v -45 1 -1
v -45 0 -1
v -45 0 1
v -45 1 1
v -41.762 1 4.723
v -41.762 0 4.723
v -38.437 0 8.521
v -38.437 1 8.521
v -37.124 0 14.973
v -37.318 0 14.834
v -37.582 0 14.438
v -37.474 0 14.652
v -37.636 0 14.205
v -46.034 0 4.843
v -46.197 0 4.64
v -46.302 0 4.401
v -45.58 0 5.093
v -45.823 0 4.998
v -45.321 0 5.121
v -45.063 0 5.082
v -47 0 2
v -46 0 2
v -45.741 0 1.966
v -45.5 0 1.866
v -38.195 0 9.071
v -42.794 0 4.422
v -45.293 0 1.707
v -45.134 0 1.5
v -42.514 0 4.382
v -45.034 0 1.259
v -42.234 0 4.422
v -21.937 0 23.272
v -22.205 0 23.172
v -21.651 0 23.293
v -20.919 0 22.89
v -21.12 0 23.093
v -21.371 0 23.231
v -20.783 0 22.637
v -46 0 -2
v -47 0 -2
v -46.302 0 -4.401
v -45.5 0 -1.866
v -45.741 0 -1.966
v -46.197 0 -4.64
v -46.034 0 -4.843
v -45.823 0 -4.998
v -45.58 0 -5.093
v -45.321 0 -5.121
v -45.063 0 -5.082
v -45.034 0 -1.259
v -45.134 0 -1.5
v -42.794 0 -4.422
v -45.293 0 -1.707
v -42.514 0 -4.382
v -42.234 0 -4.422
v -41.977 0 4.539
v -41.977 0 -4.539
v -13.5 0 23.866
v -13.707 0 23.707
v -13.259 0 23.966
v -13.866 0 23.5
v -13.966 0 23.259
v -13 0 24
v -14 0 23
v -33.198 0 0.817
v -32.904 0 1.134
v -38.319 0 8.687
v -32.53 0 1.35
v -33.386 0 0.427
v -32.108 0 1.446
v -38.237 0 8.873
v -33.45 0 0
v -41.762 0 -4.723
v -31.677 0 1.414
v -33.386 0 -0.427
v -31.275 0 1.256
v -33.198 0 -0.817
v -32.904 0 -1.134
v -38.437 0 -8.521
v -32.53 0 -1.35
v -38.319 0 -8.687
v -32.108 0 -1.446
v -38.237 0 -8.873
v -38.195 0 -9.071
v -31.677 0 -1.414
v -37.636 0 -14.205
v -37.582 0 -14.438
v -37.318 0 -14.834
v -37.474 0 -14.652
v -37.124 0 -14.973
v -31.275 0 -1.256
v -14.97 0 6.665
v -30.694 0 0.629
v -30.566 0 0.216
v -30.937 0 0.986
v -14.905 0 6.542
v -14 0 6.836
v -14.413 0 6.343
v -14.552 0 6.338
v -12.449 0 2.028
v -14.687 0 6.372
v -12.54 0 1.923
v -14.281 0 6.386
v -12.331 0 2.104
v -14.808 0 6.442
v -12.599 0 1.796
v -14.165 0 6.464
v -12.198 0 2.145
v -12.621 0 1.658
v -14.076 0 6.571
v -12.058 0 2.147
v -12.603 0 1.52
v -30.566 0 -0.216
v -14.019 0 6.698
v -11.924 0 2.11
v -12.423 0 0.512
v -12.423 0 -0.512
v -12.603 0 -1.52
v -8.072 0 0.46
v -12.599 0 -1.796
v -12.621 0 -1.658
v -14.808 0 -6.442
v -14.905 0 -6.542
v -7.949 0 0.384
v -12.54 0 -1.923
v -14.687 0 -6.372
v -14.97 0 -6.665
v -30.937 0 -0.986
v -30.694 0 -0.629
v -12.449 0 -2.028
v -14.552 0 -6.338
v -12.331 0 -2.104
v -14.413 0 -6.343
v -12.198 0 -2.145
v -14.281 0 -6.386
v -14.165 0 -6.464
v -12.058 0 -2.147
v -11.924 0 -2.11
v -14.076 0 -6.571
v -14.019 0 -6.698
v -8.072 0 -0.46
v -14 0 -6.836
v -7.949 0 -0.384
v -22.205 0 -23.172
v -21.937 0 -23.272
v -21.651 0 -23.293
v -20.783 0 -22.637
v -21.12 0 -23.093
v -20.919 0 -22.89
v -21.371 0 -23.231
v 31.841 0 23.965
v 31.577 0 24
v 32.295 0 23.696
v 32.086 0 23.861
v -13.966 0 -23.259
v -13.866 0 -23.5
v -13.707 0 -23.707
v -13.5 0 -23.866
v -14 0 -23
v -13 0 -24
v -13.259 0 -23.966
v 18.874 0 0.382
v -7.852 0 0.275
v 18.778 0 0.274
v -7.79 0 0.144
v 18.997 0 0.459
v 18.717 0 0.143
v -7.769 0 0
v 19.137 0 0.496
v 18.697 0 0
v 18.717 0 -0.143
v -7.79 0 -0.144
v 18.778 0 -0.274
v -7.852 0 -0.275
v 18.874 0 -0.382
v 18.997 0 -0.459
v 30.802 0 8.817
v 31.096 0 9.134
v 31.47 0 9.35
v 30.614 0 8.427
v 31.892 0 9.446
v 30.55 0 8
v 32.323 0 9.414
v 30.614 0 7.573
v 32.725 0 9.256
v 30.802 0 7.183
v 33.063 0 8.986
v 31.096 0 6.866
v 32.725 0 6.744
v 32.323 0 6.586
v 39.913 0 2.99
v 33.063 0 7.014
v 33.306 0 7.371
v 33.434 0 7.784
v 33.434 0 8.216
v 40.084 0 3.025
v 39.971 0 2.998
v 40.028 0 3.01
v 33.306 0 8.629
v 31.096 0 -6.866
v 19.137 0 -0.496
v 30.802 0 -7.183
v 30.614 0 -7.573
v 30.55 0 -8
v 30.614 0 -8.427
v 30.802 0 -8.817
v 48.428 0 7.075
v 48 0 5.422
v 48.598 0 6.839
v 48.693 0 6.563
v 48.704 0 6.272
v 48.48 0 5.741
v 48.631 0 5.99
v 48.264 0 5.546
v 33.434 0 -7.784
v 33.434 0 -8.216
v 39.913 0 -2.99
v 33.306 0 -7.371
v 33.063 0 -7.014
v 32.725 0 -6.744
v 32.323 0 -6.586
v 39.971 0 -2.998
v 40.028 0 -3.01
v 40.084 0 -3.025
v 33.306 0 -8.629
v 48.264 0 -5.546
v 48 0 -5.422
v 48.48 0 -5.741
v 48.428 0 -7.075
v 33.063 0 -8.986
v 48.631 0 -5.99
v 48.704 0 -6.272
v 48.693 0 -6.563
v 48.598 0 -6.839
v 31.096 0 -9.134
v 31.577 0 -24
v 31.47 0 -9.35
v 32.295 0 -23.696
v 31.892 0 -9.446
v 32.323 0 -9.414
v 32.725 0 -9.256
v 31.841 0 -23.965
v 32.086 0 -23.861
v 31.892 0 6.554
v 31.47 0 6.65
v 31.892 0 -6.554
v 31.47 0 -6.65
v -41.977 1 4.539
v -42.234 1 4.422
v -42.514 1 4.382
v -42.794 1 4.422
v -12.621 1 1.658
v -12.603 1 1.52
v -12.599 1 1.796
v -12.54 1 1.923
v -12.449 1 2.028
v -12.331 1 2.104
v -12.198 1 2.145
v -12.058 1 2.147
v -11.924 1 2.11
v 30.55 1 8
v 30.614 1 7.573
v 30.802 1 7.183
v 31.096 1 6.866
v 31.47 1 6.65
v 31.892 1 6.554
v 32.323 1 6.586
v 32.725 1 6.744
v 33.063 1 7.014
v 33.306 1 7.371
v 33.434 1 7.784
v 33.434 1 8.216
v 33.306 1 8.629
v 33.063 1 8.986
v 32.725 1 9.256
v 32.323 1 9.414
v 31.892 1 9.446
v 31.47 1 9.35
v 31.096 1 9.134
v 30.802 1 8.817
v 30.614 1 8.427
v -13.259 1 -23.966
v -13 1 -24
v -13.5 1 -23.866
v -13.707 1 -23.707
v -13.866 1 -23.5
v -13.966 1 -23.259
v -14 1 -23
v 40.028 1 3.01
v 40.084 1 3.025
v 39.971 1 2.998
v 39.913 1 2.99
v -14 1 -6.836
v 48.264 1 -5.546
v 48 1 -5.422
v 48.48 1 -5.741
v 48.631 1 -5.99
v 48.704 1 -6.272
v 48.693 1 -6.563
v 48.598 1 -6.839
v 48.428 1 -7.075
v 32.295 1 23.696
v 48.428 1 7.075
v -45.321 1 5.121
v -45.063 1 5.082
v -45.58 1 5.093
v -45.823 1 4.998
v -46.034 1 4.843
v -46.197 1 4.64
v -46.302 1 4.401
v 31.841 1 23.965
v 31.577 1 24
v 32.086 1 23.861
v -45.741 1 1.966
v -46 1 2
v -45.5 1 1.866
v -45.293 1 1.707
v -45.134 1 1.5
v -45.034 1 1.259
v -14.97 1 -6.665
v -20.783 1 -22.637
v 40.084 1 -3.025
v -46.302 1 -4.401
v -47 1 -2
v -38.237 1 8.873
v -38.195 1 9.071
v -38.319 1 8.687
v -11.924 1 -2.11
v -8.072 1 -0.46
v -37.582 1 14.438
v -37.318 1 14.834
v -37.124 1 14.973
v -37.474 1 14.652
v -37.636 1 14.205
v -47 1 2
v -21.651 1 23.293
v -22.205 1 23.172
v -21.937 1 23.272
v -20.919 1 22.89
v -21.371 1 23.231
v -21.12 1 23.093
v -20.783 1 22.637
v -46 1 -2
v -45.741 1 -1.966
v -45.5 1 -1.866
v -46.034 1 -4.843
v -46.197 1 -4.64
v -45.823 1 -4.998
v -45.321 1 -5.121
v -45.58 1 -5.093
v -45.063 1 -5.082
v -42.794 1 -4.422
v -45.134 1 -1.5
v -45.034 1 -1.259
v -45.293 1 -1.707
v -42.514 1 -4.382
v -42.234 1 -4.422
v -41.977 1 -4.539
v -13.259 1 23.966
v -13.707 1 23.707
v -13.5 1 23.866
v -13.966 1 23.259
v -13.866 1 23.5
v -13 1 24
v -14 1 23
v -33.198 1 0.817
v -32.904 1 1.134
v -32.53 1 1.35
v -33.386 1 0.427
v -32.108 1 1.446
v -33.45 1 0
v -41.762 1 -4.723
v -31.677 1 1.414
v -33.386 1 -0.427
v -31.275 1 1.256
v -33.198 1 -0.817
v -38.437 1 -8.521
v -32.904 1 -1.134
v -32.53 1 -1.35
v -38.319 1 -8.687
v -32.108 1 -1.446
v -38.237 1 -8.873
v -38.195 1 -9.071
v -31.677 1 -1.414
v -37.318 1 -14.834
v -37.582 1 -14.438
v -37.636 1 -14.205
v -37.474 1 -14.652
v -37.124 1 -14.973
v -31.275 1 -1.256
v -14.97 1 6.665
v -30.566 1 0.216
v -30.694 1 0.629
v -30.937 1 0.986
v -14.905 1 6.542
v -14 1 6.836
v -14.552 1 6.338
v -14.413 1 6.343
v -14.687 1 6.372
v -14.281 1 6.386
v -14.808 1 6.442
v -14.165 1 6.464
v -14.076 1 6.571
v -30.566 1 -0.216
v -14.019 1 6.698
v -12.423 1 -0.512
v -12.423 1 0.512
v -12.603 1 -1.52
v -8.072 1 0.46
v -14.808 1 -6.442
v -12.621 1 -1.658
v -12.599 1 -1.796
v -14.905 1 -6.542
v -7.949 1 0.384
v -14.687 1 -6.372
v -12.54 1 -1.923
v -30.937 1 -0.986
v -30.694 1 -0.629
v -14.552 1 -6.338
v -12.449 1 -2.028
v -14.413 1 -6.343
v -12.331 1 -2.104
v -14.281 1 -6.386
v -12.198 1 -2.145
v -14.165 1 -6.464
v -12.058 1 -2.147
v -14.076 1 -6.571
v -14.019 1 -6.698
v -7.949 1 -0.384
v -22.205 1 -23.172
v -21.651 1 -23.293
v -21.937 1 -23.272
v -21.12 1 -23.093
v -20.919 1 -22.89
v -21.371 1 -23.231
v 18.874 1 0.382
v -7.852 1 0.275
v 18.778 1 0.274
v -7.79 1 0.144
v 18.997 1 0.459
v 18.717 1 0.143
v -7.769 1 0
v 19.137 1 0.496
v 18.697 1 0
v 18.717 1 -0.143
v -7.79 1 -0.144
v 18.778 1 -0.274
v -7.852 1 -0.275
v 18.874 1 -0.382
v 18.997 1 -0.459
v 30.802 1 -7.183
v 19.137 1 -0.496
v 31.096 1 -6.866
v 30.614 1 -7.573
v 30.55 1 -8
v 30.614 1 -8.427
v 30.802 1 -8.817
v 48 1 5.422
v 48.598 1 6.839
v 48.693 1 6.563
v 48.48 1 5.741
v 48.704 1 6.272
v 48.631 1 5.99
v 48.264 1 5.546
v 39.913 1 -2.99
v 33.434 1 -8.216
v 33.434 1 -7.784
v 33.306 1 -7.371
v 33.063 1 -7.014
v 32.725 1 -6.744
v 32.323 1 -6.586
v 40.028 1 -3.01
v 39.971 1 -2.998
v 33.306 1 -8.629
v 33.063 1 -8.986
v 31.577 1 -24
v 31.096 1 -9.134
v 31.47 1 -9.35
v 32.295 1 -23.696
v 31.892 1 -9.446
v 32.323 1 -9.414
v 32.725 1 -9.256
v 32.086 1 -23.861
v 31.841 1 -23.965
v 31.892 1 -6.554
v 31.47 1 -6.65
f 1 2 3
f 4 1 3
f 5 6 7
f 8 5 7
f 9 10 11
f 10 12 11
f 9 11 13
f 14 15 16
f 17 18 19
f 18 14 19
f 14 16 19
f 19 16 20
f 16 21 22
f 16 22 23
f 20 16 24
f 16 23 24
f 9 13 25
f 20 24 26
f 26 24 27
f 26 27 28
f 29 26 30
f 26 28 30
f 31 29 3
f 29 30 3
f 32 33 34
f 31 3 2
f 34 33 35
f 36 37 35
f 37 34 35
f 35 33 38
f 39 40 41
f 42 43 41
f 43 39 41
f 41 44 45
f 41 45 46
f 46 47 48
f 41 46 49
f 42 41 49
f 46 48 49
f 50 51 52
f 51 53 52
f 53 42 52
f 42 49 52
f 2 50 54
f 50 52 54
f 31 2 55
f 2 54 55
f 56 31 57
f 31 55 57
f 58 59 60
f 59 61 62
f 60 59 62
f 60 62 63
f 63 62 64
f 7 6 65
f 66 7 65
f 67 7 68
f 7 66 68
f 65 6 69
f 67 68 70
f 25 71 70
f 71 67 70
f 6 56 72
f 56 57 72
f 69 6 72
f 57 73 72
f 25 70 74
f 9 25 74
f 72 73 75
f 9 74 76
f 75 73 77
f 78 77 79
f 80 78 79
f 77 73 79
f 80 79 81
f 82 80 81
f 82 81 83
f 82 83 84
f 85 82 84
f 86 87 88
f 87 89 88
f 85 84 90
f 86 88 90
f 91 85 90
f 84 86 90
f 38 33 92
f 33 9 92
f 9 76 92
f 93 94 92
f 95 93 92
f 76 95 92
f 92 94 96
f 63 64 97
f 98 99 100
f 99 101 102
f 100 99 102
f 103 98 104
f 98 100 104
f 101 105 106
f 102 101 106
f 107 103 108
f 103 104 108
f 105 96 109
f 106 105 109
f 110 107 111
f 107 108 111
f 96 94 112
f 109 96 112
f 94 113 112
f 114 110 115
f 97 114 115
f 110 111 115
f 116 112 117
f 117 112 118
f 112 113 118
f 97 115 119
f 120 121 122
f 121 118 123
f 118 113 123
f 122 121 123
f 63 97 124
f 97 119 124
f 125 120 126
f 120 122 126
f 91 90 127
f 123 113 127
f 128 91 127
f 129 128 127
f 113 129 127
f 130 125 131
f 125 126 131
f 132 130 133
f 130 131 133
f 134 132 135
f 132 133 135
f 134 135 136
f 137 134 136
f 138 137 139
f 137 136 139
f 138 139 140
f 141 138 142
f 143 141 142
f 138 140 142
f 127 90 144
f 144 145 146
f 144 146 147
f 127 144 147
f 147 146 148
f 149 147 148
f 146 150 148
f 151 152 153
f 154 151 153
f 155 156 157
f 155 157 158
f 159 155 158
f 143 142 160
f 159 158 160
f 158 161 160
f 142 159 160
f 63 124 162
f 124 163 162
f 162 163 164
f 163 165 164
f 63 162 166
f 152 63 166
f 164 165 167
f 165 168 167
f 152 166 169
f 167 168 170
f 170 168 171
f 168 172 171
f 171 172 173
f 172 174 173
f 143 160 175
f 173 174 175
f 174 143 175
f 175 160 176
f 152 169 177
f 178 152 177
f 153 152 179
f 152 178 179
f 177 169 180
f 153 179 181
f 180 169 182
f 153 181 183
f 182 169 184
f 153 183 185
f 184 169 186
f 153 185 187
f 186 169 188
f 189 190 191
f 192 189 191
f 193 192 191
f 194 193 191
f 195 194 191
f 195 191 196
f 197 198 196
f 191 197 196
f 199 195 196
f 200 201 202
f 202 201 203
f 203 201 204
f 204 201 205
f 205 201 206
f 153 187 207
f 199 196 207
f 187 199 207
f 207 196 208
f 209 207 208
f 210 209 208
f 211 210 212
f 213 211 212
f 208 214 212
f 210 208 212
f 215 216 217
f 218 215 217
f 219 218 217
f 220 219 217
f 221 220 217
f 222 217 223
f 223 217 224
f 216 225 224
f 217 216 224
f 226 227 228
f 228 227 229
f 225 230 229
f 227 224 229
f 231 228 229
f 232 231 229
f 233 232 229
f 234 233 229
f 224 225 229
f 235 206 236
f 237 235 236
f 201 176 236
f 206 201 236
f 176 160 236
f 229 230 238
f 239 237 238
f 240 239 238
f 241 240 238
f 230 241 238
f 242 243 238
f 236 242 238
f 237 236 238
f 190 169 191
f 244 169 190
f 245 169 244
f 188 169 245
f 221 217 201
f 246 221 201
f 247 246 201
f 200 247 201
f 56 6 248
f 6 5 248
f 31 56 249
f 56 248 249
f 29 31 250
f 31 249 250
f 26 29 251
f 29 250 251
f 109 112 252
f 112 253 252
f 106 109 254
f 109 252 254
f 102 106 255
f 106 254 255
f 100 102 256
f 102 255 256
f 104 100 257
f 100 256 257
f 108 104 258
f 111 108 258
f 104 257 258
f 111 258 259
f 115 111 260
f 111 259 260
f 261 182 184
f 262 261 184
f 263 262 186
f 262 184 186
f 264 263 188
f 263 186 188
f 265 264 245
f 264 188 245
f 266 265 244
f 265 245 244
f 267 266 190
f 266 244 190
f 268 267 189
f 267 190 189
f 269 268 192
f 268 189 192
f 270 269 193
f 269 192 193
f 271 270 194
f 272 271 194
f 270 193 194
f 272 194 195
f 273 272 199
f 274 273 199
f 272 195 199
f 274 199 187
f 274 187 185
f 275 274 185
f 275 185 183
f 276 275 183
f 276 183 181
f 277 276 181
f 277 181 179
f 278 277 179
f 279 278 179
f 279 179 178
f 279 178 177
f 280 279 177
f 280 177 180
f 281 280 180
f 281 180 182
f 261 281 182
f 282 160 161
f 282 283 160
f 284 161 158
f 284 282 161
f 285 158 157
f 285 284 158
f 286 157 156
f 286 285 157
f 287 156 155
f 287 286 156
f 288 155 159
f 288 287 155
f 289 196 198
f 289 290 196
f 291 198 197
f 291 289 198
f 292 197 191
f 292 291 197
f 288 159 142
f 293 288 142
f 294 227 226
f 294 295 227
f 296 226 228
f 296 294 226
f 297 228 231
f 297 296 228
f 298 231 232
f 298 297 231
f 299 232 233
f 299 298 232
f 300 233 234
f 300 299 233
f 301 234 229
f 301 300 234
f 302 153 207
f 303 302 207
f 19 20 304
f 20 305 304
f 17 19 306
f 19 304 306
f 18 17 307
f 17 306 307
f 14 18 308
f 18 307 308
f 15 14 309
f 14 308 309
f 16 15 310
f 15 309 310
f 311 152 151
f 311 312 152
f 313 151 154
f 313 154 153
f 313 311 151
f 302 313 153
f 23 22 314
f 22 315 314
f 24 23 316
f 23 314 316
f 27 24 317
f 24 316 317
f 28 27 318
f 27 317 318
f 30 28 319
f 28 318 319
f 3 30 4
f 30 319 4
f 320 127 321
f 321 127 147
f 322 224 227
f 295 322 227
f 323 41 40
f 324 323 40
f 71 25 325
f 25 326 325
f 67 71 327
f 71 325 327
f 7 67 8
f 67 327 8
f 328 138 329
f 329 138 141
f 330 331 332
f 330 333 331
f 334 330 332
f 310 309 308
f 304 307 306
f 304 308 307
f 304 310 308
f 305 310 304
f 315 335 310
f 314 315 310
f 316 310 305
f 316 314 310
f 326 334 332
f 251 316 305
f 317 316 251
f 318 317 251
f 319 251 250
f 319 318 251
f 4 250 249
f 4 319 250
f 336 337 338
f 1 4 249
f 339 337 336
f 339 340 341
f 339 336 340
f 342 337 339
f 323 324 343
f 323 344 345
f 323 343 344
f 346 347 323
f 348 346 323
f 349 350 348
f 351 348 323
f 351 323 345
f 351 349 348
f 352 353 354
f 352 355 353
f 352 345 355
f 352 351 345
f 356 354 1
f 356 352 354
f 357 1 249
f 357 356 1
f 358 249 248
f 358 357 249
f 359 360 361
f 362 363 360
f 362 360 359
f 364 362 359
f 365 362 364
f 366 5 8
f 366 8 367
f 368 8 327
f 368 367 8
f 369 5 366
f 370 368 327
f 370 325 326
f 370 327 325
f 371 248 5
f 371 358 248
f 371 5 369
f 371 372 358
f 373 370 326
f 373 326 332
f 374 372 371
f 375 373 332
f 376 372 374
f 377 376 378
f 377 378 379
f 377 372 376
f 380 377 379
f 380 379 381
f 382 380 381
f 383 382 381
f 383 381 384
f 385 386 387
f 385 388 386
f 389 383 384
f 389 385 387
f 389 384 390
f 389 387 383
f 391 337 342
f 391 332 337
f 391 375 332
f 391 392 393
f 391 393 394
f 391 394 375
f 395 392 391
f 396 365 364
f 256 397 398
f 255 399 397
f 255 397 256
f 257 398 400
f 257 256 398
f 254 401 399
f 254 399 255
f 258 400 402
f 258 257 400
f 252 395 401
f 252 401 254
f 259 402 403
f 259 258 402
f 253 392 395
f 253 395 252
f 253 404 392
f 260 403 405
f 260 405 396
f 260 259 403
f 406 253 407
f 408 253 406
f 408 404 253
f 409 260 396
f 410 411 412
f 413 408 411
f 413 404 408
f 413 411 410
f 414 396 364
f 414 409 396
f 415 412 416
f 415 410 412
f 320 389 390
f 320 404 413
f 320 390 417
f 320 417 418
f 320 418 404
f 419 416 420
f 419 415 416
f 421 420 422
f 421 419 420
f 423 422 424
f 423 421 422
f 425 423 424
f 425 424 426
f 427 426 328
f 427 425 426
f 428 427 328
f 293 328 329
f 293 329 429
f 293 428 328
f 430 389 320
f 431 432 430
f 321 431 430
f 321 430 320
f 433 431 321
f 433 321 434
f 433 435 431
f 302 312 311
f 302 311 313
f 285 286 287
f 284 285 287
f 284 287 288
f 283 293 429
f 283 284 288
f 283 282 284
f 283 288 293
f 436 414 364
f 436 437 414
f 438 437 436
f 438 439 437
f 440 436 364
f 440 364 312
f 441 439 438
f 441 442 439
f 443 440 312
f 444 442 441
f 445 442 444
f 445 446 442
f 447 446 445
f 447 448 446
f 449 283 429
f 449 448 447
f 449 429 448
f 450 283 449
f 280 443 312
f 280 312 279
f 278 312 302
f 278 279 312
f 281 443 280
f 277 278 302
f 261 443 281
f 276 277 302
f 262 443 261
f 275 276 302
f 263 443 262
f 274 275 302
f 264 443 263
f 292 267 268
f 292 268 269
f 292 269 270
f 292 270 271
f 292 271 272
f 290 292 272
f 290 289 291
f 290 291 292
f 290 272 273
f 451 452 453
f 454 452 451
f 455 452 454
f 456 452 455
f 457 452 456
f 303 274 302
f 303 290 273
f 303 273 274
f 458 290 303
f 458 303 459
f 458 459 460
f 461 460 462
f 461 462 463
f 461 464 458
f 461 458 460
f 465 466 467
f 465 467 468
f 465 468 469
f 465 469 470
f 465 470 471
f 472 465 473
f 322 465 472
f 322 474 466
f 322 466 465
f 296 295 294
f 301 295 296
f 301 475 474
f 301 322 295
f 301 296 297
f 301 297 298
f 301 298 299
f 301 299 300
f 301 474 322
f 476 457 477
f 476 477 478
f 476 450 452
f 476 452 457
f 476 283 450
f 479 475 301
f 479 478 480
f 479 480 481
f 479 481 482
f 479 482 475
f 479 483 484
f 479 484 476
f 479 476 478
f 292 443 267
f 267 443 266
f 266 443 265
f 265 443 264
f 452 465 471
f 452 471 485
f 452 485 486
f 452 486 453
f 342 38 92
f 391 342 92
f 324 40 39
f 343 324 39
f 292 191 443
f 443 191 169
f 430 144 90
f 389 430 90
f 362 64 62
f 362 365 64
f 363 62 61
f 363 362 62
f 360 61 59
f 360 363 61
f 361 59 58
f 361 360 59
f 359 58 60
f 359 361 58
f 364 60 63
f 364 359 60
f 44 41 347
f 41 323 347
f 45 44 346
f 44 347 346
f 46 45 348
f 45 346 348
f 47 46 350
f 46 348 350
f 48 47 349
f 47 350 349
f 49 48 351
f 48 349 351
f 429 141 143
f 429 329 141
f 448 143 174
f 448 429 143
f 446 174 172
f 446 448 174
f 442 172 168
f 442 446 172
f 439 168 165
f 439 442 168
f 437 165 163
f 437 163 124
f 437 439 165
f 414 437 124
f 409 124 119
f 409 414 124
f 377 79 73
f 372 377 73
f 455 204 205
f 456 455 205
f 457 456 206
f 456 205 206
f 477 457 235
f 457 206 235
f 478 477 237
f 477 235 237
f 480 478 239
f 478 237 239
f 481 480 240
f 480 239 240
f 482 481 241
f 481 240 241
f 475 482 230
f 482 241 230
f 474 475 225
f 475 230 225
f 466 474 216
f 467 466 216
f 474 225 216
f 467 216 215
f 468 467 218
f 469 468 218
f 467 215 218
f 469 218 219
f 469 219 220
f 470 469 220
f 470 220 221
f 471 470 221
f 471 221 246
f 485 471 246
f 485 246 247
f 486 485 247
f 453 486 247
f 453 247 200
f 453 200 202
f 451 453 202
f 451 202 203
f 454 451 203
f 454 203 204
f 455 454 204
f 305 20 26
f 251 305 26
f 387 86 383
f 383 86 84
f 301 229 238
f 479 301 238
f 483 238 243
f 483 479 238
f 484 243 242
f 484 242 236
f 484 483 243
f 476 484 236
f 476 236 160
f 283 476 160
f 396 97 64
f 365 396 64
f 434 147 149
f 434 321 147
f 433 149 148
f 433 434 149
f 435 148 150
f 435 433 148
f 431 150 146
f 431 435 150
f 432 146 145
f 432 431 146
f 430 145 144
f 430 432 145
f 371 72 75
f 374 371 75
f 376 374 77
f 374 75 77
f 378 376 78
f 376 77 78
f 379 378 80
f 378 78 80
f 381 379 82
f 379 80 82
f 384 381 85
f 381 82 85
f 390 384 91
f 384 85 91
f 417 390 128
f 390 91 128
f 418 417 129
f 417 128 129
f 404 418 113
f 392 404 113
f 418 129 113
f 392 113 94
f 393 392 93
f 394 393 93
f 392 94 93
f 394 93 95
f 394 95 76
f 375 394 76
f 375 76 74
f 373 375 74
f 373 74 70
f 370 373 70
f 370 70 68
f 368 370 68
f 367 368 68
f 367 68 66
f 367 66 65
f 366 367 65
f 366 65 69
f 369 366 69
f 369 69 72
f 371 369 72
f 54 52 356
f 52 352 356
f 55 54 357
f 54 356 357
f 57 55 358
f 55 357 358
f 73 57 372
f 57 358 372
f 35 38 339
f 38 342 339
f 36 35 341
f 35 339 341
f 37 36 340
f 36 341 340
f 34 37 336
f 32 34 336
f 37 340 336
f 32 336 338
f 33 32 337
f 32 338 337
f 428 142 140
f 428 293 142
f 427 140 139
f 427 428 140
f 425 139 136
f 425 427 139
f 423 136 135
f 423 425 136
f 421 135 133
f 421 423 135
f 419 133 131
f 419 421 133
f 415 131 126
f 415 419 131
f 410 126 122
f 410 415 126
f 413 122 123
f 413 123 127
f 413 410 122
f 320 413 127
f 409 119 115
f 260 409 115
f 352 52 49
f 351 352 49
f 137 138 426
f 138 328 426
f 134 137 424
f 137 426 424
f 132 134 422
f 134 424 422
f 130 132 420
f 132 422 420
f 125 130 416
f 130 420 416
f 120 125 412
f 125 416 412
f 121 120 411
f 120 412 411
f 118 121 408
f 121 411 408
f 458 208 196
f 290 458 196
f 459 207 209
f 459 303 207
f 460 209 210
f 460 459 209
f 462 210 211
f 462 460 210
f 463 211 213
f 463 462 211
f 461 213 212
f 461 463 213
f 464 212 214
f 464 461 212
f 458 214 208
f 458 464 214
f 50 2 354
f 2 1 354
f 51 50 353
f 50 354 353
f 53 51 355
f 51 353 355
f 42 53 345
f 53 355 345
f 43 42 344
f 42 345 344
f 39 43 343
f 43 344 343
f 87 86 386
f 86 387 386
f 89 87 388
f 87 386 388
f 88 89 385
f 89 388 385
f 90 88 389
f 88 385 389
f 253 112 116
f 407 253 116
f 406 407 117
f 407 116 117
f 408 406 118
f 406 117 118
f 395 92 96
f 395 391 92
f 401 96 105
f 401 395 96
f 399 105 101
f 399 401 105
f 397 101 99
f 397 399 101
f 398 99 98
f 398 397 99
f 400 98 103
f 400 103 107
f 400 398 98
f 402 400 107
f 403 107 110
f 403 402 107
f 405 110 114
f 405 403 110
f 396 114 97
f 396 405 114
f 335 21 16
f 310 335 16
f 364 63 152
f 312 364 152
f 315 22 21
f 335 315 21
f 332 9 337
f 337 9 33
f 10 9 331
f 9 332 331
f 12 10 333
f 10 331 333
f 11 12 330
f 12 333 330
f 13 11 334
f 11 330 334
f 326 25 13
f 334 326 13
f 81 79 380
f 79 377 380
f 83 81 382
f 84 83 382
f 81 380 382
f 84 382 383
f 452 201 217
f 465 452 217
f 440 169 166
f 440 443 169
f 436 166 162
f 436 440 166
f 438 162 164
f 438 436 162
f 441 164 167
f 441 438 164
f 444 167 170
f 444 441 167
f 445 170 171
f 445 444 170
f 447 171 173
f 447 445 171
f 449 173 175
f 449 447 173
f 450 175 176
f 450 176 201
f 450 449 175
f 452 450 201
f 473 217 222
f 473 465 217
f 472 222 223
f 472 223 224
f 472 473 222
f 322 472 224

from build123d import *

# Parameters (mm, degrees)
BOSS_EXTRUDE2_DEPTH        = 1
FILLET1_R                  = 1
FILLET2_R                  = 0.5
M2_5_CLEARANCE_HOLE1_D     = 2.9
M2_5_CLEARANCE_HOLE1_DEPTH = 7.25
M2_5_CLEARANCE_HOLE1_TIP   = 0.871247898


with BuildPart() as part:
    # Sketch6 → Boss-Extrude2 (new body)
    with BuildSketch(Plane(origin=(0, 0, 0), x_dir=(1, 0, 0), z_dir=(0, 1, 0))):
        Polygon((-21.18242301, -23.733545037), (-14, -4), (-14, -24), (32, -24), (49.571034579, -5.897463907), (40, -3), (15, 0), (40, 3), (49.571034579, 5.897463907), (32, 24), (-14, 24), (-14, 4), (-21.18242301, 23.733545037), (-37.579939109, 14.722767652), (-38.229006165, 8.757978304), (-42.181953388, 4.244198486), (-46.02292771, 5.360852532), (-47, 2), (-45, 2), (-45, -2), (-47, -2), (-46.02292771, -5.360852532), (-42.181953388, -4.244198486), (-38.229006165, -8.757978304), (-37.579939109, -14.722767652), align=None)
        with BuildLine():
            Line((-7, 0), (-13.002008181, -2.57228922))
            ThreePointArc((-13.002008181, -2.57228922), (-12.400581568, 0), (-13.002008181, 2.57228922))
            Line((-13.002008181, 2.57228922), (-7, 0))
        make_face(mode=Mode.SUBTRACT)
    extrude(amount=BOSS_EXTRUDE2_DEPTH)

    # Fillet1
    fillet1_edges = [part.edges().sort_by_distance(p)[0] for p in [
        (-14, 0.5, -24),
        (32, 0.5, -24),
        (49.571034579, 0.5, -5.897463907),
        (40, 0.5, -3),
        (40, 0.5, 3),
        (49.571034579, 0.5, 5.897463907),
        (32, 0.5, 24),
        (-14, 0.5, 24),
        (-21.18242301, 0.5, 23.733545037),
        (-37.579939109, 0.5, 14.722767652),
        (-38.229006165, 0.5, 8.757978304),
        (-42.181953388, 0.5, 4.244198486),
        (-46.02292771, 0.5, 5.360852532),
        (-45, 0.5, 2),
        (-21.18242301, 0.5, -23.733545037),
        (-37.579939109, 0.5, -14.722767652),
        (-38.229006165, 0.5, -8.757978304),
        (-42.181953388, 0.5, -4.244198486),
        (-46.02292771, 0.5, -5.360852532),
        (-45, 0.5, -2),
    ]]
    fillet(fillet1_edges, radius=FILLET1_R)

    # Fillet2
    fillet2_edges = [part.edges().sort_by_distance(p)[0] for p in [
        (-7, 0.5, 0),
        (-13.002008181, 0.5, -2.57228922),
        (-14, 0.5, -4),
        (15, 0.5, 0),
        (-14, 0.5, 4),
        (-13.002008181, 0.5, 2.57228922),
    ]]
    fillet(fillet2_edges, radius=FILLET2_R)

    # M2.5 Clearance Hole1
    with Locations(Plane(origin=(0, 1, 0), x_dir=(1, 0, 0), z_dir=(0, 1, 0))):
        with Locations((-32, 0), (32, 8), (32, -8)):
            Hole(M2_5_CLEARANCE_HOLE1_D / 2, depth=M2_5_CLEARANCE_HOLE1_DEPTH)
            with Locations((0, 0, -(M2_5_CLEARANCE_HOLE1_DEPTH + M2_5_CLEARANCE_HOLE1_TIP / 2))):  # 118° drill point
                Cone(0, M2_5_CLEARANCE_HOLE1_D / 2, M2_5_CLEARANCE_HOLE1_TIP, mode=Mode.SUBTRACT)


solid = part.part
